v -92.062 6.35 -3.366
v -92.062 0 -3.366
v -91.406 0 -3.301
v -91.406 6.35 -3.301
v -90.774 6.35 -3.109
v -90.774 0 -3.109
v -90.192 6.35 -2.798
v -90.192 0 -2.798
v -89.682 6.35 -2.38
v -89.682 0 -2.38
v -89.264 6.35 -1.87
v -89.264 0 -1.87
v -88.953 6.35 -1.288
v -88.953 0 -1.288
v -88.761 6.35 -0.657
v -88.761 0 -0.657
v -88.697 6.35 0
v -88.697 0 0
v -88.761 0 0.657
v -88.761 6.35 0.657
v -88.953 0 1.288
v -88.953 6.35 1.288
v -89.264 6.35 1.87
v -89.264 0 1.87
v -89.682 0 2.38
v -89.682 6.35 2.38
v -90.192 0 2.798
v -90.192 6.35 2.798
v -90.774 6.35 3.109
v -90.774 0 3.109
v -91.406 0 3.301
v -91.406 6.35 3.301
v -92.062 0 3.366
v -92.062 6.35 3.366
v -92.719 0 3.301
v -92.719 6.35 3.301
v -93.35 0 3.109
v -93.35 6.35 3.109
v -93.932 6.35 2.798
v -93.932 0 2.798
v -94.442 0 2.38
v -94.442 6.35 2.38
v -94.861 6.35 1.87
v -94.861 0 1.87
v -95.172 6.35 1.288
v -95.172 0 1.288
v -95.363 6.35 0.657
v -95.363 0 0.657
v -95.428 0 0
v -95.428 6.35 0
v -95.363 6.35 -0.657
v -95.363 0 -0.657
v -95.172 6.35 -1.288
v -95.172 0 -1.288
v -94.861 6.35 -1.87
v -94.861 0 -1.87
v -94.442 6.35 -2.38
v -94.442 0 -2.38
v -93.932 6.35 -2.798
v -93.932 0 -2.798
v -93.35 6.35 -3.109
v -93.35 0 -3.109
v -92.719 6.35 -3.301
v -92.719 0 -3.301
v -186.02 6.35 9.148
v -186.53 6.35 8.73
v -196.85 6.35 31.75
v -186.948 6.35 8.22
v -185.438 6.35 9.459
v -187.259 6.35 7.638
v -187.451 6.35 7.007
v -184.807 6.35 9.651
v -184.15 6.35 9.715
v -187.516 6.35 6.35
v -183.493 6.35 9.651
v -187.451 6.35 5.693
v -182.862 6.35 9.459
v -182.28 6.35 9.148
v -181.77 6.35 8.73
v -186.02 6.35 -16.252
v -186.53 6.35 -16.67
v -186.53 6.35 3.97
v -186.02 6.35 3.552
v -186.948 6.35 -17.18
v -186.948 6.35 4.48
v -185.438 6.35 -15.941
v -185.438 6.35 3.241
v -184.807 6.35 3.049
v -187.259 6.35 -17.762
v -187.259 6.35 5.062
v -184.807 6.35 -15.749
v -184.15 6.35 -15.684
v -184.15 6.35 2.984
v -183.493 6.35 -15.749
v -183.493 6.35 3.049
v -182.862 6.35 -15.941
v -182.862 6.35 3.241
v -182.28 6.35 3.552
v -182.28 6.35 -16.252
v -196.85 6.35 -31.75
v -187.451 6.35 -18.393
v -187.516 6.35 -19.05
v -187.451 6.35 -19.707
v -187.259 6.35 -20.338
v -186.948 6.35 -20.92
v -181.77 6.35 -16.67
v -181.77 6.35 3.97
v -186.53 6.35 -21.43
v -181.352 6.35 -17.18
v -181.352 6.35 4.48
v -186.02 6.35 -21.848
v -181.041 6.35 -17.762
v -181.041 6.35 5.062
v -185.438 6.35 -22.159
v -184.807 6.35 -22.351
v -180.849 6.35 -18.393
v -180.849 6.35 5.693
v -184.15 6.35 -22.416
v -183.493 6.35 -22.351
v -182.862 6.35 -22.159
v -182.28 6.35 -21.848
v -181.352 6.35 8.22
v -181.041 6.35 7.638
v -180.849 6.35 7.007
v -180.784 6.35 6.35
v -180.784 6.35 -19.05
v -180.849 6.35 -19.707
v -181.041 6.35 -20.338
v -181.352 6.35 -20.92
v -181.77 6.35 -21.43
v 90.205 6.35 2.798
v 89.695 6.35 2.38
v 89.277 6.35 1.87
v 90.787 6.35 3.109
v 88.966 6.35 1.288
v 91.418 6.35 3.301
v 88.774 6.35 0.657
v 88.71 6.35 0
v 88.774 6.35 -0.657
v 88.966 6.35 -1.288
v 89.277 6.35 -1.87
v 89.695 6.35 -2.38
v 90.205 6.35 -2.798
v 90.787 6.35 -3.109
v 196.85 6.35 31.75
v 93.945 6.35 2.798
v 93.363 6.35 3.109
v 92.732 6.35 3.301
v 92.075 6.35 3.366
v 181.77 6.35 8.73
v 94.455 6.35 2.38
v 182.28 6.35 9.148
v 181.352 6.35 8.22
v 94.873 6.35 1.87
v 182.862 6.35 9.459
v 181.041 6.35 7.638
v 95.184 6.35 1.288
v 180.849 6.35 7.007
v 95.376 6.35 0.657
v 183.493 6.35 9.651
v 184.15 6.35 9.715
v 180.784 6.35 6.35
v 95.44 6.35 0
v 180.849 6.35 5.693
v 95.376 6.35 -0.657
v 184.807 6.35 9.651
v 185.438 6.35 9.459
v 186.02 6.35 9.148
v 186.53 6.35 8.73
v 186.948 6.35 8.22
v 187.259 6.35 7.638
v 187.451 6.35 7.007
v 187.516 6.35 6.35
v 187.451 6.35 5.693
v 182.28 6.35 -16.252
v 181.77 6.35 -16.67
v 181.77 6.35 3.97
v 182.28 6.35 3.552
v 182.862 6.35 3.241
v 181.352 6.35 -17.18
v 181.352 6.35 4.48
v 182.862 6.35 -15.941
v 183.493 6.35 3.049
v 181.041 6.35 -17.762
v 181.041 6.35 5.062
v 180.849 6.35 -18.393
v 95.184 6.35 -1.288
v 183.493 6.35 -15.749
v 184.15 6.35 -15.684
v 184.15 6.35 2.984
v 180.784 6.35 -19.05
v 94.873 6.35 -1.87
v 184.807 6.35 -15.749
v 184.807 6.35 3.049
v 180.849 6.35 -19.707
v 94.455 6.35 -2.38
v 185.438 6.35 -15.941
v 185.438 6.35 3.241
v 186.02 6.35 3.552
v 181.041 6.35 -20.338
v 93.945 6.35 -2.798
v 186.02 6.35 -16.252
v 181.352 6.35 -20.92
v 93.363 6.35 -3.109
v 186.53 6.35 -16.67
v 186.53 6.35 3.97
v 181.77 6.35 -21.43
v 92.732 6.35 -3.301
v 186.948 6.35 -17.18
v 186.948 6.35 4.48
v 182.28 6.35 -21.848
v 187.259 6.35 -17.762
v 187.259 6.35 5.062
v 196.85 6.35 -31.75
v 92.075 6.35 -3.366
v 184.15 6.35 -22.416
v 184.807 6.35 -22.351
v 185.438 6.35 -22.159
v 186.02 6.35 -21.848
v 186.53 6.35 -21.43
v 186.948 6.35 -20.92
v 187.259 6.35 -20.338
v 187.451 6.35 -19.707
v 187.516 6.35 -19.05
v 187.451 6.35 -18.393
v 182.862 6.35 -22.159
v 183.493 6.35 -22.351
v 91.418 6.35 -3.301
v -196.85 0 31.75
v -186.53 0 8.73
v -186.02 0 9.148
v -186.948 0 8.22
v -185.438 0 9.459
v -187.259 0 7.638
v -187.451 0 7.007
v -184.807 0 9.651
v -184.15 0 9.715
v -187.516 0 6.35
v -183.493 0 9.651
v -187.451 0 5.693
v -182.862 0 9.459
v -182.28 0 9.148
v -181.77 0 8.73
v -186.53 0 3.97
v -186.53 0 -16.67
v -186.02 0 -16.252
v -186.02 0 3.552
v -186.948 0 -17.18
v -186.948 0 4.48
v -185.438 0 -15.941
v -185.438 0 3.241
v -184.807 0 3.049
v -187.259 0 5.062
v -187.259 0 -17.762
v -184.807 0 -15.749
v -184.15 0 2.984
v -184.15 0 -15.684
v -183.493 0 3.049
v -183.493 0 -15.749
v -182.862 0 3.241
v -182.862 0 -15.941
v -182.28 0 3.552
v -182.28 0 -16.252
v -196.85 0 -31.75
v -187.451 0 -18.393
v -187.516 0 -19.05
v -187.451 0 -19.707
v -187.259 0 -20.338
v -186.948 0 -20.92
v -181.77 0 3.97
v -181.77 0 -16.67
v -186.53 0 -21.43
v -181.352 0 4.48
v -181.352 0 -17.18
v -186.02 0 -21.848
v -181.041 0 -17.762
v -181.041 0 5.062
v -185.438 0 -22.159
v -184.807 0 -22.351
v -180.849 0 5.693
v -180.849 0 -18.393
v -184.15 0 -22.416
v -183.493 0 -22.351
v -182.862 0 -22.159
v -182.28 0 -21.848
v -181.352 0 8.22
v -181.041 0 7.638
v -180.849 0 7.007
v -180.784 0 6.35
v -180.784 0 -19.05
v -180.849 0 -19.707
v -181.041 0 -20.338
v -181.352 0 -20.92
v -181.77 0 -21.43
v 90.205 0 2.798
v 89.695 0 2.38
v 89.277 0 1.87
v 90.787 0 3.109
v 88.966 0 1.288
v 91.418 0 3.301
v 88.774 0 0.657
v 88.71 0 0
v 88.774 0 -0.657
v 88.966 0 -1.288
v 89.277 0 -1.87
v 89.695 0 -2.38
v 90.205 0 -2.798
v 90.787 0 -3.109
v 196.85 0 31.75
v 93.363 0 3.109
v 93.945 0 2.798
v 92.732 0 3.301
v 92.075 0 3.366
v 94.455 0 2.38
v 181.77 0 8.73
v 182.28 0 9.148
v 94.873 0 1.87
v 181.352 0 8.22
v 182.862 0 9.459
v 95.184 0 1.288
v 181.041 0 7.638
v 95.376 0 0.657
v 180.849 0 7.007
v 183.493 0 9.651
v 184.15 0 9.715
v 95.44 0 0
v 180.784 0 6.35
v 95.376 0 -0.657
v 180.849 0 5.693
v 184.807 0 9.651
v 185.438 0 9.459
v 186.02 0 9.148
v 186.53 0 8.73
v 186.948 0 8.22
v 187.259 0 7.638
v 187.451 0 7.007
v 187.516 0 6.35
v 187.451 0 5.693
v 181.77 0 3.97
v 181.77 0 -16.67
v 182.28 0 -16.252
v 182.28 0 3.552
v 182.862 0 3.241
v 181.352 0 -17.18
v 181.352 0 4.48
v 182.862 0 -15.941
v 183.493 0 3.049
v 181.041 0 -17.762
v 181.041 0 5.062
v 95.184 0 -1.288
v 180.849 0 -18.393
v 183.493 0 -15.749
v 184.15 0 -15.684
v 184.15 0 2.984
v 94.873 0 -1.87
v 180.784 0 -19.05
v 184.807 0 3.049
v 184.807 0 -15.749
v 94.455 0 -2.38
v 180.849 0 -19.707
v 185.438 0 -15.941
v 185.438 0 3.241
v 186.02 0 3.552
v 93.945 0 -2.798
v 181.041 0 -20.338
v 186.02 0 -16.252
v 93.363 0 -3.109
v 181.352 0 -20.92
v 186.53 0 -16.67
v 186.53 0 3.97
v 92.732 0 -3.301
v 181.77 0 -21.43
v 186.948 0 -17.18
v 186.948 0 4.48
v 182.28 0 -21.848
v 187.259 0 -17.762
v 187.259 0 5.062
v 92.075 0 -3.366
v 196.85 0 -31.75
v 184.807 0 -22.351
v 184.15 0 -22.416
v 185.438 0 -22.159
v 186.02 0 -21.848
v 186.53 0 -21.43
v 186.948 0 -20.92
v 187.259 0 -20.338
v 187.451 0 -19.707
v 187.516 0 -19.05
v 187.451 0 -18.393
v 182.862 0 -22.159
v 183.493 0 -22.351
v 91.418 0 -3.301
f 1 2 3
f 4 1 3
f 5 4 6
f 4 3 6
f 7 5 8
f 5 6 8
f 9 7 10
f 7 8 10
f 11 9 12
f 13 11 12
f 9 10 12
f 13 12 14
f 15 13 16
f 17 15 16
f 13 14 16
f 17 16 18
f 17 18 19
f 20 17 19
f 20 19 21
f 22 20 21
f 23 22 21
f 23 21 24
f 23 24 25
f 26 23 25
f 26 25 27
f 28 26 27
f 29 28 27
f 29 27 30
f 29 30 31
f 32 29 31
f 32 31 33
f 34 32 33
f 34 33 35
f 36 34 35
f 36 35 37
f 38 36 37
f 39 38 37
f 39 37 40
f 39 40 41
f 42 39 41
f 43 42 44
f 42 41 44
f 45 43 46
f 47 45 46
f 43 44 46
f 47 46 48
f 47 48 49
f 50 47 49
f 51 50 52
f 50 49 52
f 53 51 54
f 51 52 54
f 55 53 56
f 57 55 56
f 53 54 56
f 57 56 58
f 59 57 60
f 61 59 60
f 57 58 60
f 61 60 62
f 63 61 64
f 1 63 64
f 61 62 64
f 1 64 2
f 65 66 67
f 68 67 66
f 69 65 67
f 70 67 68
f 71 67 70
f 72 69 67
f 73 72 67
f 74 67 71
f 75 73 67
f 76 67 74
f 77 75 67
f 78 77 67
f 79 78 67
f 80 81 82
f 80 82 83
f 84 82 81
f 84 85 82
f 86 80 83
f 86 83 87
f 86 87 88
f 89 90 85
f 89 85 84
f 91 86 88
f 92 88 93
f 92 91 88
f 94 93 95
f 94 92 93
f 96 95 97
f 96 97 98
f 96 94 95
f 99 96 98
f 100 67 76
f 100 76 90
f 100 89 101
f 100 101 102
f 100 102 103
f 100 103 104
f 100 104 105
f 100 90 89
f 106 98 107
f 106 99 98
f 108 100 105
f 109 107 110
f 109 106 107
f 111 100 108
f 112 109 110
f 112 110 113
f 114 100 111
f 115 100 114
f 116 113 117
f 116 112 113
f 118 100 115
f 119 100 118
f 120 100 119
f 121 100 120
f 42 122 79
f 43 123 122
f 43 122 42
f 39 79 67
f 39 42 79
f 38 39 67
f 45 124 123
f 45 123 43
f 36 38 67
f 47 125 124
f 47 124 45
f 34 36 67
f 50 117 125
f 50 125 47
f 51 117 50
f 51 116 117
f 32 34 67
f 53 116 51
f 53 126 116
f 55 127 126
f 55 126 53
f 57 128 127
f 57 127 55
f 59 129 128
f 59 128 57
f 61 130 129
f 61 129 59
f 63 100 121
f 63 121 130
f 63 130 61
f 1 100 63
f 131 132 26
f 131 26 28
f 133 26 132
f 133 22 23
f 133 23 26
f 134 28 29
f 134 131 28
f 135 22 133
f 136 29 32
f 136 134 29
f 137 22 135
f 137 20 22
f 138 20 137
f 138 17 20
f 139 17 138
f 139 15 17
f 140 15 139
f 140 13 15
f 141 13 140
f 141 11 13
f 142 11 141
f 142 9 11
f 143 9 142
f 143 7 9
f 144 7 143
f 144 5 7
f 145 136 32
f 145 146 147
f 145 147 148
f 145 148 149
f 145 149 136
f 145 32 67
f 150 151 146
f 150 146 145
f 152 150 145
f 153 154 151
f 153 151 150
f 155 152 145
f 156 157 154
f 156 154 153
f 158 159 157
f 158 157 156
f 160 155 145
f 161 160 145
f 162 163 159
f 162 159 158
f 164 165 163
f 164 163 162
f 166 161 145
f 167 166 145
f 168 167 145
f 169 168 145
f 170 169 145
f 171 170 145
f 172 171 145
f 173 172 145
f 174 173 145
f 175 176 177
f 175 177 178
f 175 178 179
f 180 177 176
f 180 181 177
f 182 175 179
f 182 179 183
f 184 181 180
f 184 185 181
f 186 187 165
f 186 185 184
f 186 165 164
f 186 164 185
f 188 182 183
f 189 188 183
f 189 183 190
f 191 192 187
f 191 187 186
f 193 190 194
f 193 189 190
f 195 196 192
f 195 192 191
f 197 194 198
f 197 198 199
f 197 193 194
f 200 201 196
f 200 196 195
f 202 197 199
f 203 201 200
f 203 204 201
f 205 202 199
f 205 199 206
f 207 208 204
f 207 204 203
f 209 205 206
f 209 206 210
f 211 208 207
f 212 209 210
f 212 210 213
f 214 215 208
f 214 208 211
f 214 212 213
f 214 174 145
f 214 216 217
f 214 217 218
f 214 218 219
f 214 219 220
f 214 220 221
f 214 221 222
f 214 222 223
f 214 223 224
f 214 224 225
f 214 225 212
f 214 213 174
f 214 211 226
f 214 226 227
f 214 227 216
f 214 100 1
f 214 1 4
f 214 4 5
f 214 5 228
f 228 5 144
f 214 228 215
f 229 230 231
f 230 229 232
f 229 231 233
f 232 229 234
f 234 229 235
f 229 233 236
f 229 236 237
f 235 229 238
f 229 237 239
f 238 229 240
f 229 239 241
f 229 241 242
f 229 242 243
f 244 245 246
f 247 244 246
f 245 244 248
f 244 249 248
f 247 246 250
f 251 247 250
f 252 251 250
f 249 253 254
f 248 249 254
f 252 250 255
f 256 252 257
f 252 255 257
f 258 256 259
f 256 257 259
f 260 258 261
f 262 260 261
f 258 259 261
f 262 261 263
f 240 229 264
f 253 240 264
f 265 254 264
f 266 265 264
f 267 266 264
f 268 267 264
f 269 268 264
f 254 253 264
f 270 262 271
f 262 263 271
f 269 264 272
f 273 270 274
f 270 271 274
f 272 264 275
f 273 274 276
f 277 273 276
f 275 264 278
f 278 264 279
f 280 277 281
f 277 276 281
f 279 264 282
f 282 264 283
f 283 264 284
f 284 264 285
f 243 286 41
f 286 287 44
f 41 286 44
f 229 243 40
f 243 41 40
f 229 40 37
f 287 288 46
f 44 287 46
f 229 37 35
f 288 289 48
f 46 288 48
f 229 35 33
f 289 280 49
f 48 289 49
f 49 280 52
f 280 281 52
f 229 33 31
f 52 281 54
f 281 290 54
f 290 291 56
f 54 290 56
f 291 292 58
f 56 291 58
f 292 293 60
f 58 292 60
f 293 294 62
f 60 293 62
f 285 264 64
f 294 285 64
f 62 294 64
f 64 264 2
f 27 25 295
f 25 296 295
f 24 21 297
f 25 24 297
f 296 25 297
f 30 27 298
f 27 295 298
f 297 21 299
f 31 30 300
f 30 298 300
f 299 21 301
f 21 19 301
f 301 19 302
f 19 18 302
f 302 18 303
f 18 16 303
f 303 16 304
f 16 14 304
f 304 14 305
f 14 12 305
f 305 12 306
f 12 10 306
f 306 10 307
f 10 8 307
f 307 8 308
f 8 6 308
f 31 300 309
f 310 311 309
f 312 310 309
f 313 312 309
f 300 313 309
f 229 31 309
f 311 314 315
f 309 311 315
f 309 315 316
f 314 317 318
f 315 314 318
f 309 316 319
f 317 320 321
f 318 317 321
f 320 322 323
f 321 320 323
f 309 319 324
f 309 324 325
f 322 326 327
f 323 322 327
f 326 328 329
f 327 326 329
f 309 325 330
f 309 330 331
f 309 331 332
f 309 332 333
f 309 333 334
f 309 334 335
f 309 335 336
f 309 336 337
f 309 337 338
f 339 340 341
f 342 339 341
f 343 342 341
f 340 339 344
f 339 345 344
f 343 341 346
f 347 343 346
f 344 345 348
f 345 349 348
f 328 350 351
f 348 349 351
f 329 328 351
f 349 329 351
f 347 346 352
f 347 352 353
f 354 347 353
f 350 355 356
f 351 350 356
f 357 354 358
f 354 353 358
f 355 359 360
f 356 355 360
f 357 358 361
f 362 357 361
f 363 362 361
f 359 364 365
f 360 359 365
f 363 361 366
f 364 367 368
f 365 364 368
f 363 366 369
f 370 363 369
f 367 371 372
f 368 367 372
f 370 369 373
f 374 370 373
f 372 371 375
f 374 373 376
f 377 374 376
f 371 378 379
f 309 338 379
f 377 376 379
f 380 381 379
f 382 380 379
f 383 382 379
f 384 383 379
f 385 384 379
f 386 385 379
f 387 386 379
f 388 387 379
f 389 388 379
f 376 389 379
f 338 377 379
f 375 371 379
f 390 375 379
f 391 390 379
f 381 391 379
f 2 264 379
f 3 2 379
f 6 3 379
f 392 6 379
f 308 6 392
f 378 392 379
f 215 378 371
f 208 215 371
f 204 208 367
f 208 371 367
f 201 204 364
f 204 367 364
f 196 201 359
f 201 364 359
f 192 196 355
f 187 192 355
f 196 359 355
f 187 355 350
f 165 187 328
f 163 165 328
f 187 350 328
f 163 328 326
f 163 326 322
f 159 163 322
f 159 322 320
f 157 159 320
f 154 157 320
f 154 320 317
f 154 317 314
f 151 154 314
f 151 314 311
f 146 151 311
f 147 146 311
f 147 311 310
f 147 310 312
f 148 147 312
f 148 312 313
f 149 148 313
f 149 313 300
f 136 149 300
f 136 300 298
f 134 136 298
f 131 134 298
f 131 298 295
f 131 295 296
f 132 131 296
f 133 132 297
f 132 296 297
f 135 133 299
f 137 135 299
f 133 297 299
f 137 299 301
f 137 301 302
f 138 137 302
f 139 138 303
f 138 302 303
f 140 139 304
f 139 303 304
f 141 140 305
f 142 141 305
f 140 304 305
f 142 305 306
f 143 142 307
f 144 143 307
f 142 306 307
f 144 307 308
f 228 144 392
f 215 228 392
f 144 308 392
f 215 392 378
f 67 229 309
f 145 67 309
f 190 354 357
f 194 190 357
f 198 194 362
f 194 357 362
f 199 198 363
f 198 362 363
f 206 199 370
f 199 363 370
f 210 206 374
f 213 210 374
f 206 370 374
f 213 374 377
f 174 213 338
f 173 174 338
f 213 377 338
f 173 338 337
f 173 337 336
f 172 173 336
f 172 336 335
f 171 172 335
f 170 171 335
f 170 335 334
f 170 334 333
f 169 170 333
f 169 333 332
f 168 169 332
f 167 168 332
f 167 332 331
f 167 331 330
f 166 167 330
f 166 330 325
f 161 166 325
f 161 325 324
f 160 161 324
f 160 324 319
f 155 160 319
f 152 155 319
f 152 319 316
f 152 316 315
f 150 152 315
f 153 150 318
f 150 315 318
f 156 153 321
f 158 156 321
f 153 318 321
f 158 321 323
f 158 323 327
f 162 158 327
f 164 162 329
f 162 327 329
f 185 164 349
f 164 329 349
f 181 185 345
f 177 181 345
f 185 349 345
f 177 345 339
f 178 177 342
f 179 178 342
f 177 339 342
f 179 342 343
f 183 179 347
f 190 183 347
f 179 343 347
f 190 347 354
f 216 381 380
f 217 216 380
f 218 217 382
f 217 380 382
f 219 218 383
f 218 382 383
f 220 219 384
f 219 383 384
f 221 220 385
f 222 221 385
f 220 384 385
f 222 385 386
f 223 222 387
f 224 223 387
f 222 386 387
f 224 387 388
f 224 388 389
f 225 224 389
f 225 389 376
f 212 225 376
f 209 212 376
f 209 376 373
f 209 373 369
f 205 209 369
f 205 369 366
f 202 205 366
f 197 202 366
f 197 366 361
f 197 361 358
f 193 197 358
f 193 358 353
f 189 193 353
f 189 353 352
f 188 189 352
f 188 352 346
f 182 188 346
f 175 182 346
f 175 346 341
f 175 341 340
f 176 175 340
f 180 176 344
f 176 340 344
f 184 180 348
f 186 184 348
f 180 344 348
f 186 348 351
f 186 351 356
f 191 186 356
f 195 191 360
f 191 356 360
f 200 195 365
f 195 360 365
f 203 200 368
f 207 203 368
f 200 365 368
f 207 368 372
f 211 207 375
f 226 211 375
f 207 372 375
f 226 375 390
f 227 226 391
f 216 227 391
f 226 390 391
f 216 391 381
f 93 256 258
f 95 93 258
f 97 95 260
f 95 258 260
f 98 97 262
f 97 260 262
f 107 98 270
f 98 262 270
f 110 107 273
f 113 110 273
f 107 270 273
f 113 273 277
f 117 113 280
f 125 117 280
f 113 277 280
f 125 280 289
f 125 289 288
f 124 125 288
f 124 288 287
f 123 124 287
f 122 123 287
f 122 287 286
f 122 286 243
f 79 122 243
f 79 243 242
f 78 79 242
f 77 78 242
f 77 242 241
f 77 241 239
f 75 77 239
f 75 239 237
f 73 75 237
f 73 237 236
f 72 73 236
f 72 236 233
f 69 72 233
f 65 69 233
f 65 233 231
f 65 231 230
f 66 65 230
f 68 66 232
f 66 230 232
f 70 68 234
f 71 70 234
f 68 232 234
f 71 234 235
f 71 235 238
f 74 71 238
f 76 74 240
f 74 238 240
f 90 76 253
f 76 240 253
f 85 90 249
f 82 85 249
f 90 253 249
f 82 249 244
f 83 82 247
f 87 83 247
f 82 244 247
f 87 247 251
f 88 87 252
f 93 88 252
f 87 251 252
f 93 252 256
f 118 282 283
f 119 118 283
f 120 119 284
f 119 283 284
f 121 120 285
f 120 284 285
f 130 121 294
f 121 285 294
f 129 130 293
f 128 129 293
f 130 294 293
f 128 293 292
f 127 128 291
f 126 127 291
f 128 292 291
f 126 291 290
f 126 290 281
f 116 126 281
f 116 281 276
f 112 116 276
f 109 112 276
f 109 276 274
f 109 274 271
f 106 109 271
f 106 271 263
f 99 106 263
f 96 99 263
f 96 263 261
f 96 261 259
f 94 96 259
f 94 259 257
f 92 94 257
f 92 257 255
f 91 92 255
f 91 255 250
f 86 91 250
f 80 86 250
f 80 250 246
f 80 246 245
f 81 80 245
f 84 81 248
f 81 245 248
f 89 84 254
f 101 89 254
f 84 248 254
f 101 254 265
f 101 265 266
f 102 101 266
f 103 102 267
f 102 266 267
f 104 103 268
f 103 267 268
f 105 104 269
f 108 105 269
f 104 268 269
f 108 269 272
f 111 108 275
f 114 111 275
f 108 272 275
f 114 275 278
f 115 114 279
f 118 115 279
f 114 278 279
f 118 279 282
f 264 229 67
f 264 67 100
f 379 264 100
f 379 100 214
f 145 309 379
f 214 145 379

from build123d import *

# Parameters (mm, degrees)
SKETCH1_W           = 393.7
SKETCH1_H           = 63.5
BOSS_EXTRUDE1_DEPTH = 6.35
SKETCH2_R           = 3.3655
SKETCH2_R_2         = 2.5527
CUT_EXTRUDE1_DEPTH  = 200.49513152


with BuildPart() as part:
    # Sketch1 → Boss-Extrude1 (new body)
    with BuildSketch(Plane(origin=(0, 0, 0), x_dir=(1, 0, 0), z_dir=(0, 1, 0))):
        Rectangle(SKETCH1_W, SKETCH1_H)
    extrude(amount=BOSS_EXTRUDE1_DEPTH)

    # Sketch2 → Cut-Extrude1 (cut, through all)
    with BuildSketch(Plane.XZ):
        with Locations(Location((-92.062267829, 0, 0), (0, 0, 270))):
            Circle(SKETCH2_R)
        with Locations((-92.062267829, 0)):
            Circle(SKETCH2_R_2, mode=Mode.SUBTRACT)
        with Locations((-92.062267829, 0)):
            Circle(SKETCH2_R_2)
        with Locations(Location((-184.15, 6.35, 0), (0, 0, 270))):
            Circle(SKETCH2_R)
        with Locations(Location((-184.15, -19.05, 0), (0, 0, 270))):
            Circle(SKETCH2_R)
        with Locations(Location((92.075, 0, 0), (0, 0, 270))):
            Circle(SKETCH2_R)
        with Locations((92.075, 0)):
            Circle(SKETCH2_R_2, mode=Mode.SUBTRACT)
        with Locations((92.075, 0)):
            Circle(SKETCH2_R_2)
        with Locations(Location((184.15, 6.35, 0), (0, 0, 270))):
            Circle(SKETCH2_R)
        with Locations(Location((184.15, -19.05, 0), (0, 0, 270))):
            Circle(SKETCH2_R)
    extrude(amount=-CUT_EXTRUDE1_DEPTH, mode=Mode.SUBTRACT)


solid = part.part
